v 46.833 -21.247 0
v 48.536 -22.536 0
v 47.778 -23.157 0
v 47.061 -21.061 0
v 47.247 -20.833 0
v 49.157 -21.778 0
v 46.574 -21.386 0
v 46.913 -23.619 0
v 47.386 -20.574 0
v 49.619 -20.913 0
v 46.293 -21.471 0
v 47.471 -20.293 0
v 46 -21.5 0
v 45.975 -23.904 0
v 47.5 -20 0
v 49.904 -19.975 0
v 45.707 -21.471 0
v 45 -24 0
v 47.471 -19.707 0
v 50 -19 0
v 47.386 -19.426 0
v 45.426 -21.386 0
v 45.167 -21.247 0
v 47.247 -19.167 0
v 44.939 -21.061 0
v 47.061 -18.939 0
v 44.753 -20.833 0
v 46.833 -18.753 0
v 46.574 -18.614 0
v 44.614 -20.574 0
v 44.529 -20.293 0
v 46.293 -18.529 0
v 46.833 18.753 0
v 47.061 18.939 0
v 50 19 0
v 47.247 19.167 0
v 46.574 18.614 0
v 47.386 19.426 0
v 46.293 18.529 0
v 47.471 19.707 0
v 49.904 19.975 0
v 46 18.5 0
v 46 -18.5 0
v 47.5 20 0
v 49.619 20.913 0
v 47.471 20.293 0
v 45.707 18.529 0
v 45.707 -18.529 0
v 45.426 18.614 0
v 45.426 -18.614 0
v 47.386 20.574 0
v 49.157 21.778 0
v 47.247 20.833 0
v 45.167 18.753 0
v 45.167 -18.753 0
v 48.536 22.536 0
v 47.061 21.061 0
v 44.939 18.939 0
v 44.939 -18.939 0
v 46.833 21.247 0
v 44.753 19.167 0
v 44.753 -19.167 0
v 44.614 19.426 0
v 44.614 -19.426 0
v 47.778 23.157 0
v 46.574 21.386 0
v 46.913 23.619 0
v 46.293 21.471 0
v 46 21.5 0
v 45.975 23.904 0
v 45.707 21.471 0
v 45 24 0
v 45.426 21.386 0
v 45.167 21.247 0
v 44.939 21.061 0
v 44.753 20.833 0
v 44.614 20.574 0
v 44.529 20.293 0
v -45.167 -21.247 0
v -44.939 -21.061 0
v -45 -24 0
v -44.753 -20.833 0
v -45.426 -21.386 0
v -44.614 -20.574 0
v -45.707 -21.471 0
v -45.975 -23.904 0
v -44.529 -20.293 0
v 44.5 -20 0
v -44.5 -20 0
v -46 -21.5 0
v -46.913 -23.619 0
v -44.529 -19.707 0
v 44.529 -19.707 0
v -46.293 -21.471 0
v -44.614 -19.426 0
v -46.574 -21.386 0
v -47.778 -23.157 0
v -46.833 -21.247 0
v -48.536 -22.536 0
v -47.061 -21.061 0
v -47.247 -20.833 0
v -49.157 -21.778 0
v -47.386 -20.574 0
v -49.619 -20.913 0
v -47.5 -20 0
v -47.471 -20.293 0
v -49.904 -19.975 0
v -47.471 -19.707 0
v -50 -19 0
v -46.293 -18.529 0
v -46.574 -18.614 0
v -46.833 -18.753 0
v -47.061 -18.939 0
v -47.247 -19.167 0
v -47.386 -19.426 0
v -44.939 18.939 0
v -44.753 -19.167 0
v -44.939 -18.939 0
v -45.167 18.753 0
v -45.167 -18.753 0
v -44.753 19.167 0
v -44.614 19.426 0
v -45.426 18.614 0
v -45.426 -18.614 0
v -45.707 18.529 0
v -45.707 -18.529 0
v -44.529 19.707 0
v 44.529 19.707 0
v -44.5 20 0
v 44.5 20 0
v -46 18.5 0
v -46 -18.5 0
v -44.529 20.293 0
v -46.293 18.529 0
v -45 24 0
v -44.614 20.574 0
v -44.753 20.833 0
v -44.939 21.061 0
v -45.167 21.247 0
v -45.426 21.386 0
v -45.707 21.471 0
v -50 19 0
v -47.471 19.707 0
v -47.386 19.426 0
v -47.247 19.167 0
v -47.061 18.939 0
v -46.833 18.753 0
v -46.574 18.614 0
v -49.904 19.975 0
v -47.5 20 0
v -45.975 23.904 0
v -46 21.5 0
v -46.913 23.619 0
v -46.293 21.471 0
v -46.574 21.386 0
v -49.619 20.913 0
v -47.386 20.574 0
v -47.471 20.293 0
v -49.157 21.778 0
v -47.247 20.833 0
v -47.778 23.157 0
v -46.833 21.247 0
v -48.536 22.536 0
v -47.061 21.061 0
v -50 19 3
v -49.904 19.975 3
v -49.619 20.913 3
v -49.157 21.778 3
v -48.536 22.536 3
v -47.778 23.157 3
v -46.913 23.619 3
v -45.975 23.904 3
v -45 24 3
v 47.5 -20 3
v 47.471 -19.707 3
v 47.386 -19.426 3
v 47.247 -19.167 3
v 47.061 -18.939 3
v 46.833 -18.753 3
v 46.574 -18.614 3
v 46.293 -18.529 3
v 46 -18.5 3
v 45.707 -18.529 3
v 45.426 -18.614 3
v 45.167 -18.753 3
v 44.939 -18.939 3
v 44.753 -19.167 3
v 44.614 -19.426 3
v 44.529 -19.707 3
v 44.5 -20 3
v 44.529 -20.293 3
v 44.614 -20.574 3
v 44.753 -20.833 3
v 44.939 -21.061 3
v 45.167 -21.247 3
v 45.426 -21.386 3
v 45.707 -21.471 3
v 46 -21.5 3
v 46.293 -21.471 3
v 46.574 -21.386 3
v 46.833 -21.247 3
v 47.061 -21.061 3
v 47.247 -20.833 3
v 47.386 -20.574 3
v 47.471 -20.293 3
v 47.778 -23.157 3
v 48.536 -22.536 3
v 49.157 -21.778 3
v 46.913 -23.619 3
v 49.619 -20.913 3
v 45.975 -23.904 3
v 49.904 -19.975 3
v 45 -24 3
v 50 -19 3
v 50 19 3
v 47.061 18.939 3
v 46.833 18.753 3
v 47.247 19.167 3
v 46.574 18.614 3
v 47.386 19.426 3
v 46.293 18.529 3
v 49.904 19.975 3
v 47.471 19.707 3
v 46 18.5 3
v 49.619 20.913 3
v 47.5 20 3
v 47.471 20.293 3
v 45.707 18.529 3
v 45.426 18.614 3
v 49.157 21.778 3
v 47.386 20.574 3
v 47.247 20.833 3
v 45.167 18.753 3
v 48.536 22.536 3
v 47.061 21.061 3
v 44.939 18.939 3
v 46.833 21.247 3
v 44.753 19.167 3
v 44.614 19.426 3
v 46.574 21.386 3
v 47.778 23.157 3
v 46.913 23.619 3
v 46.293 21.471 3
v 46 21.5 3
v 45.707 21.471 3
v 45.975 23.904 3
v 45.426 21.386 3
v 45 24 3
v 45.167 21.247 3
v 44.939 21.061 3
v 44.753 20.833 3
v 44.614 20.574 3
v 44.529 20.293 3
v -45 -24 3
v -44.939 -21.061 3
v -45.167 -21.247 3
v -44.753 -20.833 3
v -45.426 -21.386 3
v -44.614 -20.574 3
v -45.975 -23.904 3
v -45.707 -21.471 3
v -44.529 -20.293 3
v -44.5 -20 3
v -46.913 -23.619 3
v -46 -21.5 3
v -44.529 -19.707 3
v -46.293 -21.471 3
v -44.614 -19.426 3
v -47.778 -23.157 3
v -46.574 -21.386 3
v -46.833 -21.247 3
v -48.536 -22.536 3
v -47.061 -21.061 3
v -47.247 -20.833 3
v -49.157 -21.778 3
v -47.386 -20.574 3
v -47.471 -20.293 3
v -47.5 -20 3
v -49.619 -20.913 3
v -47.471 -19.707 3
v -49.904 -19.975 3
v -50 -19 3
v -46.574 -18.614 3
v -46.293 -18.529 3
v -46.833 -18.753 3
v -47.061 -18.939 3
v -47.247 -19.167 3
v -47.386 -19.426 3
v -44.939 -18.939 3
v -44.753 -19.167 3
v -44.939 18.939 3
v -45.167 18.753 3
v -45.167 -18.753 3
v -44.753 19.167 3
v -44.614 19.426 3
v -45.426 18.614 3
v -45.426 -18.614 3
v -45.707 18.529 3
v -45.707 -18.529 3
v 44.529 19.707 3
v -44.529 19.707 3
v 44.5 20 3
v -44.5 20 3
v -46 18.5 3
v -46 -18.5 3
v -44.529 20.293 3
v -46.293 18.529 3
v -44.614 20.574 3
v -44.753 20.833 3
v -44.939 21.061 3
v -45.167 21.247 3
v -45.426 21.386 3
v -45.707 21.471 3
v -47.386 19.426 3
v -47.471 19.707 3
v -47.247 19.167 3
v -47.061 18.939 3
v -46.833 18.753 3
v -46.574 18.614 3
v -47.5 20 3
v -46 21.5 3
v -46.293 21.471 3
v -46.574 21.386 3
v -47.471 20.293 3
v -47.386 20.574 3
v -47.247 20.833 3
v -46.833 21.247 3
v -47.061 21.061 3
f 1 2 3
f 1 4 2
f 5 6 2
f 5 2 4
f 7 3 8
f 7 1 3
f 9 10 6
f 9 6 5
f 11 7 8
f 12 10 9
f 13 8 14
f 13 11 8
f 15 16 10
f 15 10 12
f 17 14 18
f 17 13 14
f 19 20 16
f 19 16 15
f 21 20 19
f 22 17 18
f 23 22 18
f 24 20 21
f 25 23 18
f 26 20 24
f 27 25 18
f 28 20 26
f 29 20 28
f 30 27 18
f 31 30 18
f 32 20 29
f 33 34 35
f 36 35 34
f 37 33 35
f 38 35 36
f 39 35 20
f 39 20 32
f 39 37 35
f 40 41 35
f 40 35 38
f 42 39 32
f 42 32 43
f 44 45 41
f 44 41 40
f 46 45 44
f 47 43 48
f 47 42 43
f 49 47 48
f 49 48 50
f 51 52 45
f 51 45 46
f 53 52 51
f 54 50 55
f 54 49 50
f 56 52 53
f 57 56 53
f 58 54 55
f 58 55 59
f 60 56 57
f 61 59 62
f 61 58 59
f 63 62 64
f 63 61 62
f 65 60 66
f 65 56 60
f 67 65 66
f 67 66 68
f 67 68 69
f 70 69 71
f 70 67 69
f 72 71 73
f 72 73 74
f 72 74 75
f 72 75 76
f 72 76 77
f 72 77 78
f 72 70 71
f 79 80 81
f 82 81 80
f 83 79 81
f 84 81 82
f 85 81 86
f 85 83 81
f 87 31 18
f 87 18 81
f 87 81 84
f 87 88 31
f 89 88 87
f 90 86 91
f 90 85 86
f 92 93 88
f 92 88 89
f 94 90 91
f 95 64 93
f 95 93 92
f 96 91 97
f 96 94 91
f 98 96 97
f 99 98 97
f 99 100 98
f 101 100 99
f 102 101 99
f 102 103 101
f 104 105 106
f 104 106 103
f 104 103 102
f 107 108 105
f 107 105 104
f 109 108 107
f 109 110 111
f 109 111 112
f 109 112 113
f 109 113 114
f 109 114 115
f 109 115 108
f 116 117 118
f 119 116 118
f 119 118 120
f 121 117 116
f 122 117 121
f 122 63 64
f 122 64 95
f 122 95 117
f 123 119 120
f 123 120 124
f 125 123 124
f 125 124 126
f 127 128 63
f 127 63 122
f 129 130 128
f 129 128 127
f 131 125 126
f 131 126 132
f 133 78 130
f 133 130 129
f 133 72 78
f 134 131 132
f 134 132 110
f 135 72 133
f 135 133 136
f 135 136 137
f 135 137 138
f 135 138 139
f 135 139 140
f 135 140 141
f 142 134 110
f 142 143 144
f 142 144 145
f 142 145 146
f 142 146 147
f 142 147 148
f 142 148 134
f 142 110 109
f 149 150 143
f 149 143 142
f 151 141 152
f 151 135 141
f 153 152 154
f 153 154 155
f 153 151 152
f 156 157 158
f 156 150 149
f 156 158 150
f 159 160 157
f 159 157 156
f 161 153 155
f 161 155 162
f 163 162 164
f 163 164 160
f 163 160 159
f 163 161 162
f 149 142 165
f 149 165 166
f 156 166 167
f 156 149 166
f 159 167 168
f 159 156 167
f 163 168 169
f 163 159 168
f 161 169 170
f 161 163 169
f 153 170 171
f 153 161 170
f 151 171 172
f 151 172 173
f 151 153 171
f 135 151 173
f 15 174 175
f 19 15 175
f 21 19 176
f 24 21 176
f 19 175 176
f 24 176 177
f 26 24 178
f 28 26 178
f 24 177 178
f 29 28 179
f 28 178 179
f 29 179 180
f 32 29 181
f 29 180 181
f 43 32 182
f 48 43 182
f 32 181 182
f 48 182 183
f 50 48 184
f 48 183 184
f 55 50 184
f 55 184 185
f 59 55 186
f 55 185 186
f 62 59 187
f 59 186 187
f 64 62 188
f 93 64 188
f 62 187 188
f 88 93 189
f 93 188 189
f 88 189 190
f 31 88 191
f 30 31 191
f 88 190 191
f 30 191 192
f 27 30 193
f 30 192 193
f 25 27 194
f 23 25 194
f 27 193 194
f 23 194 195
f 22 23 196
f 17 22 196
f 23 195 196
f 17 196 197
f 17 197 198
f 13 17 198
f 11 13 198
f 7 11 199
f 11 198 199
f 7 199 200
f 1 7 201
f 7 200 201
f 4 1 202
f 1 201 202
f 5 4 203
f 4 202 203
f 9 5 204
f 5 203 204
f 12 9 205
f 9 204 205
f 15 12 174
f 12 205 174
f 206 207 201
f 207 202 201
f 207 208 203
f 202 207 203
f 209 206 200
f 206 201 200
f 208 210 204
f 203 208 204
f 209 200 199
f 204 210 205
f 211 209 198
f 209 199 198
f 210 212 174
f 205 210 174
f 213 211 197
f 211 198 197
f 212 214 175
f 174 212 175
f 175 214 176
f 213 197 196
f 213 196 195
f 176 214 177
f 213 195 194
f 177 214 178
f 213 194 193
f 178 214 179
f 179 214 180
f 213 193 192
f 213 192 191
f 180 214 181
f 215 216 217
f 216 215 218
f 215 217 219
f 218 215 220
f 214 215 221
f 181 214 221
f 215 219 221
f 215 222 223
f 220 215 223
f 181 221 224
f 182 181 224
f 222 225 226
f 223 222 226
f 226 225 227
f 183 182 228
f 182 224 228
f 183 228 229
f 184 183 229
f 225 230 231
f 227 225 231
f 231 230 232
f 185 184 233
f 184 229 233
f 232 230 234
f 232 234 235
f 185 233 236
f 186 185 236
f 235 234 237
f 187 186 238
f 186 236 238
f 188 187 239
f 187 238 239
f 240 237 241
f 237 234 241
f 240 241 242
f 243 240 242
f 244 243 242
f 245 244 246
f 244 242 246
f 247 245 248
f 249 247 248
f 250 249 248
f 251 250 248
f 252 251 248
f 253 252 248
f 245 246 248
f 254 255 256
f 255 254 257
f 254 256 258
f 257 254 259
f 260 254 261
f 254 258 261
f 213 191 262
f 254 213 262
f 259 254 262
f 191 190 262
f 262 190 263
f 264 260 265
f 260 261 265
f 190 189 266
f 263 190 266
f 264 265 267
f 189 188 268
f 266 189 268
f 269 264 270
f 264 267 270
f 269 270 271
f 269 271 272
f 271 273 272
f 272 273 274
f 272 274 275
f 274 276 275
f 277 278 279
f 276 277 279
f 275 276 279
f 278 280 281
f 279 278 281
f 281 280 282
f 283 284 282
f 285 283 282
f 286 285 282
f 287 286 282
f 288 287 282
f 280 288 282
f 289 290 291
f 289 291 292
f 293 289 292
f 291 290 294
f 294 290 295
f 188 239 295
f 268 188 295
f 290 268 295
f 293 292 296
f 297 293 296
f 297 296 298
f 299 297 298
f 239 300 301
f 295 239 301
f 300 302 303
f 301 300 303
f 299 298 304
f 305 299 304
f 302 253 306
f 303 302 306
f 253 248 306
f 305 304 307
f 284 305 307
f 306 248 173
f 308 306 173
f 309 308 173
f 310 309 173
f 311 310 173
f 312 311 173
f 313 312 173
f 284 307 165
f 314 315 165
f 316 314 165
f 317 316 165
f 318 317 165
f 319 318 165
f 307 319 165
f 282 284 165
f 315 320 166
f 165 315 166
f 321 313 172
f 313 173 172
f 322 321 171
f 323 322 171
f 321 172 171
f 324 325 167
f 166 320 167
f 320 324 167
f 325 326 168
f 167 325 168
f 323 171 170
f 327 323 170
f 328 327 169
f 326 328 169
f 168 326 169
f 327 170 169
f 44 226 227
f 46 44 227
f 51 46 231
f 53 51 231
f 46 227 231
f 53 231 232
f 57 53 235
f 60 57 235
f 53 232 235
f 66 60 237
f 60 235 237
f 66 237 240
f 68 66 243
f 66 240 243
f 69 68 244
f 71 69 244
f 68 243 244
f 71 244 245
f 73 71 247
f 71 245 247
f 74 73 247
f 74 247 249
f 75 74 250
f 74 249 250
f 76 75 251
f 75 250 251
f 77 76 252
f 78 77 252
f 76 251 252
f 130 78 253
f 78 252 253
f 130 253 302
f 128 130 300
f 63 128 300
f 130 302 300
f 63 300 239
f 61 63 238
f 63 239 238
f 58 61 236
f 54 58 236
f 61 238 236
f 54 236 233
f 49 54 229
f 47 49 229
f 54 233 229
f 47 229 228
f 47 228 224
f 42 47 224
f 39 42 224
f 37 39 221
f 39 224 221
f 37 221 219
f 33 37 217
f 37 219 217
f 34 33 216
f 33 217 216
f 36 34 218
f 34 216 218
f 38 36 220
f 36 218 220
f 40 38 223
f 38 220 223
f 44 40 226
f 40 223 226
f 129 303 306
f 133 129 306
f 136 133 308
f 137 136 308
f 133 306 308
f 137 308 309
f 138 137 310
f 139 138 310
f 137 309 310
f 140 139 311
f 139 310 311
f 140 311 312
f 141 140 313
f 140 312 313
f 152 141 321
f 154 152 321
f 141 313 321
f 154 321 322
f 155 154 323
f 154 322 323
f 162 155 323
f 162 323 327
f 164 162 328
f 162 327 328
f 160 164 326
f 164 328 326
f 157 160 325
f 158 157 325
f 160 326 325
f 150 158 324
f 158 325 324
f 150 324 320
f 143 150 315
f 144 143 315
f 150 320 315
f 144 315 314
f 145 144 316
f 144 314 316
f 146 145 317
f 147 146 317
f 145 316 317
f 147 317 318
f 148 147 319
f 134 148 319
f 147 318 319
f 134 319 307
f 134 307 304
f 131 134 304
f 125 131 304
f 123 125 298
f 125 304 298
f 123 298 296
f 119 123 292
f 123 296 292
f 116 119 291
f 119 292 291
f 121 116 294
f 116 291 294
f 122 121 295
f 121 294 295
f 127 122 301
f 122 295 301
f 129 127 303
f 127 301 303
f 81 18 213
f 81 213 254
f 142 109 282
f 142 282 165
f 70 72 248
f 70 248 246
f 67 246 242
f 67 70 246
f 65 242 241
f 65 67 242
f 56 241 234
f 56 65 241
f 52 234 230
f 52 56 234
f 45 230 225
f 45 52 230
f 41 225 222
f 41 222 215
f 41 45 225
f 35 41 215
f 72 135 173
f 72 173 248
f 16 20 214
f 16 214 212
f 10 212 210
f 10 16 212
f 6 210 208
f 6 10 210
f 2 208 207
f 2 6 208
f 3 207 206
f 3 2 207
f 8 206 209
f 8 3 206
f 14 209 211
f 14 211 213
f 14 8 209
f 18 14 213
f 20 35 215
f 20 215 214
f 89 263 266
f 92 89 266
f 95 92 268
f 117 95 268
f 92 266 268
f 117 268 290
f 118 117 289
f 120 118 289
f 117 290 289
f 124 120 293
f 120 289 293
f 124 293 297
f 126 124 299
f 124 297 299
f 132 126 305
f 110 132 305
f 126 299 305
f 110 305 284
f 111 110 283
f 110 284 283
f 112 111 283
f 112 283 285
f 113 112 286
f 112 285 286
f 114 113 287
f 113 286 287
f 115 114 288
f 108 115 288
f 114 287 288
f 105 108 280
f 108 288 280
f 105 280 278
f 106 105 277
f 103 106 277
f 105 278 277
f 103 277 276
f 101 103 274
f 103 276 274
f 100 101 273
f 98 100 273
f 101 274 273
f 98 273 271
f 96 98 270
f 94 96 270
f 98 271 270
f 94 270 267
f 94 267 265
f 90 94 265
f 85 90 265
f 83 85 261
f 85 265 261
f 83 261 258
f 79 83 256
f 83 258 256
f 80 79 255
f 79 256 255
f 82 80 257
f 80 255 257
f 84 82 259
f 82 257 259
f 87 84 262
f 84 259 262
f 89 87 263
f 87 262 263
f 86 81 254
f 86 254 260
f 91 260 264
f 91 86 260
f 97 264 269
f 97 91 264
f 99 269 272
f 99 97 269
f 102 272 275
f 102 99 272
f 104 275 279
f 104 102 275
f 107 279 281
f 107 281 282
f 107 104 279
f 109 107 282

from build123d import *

# Parameters (mm, degrees)
EXTRUDE_1_DEPTH     = 3
SKETCH_2_R          = 1.5
CUT_EXTRUDE_1_DEPTH = 3


with BuildPart() as part:
    # 草图1 → 凸台-拉伸1 (new body)
    with BuildSketch(Plane.XY):
        with BuildLine():
            Line((-45, 24), (45, 24))
            ThreePointArc((45, 24), (48.535533906, 22.535533906), (50, 19))
            Line((50, 19), (50, -19))
            ThreePointArc((50, -19), (48.535533906, -22.535533906), (45, -24))
            Line((45, -24), (-45, -24))
            ThreePointArc((-45, -24), (-48.535533906, -22.535533906), (-50, -19))
            Line((-50, -19), (-50, 19))
            ThreePointArc((-50, 19), (-48.535533906, 22.535533906), (-45, 24))
        make_face()
    extrude(amount=EXTRUDE_1_DEPTH)

    # 草图2 → 切除-拉伸1 (cut)
    with BuildSketch(Plane.XY.offset(3)):
        with Locations((-46, 20)):
            Circle(SKETCH_2_R)
        with Locations((46, 20)):
            Circle(SKETCH_2_R)
        with Locations((-46, -20)):
            Circle(SKETCH_2_R)
        with Locations((46, -20)):
            Circle(SKETCH_2_R)
    extrude(amount=-CUT_EXTRUDE_1_DEPTH, mode=Mode.SUBTRACT)


solid = part.part
